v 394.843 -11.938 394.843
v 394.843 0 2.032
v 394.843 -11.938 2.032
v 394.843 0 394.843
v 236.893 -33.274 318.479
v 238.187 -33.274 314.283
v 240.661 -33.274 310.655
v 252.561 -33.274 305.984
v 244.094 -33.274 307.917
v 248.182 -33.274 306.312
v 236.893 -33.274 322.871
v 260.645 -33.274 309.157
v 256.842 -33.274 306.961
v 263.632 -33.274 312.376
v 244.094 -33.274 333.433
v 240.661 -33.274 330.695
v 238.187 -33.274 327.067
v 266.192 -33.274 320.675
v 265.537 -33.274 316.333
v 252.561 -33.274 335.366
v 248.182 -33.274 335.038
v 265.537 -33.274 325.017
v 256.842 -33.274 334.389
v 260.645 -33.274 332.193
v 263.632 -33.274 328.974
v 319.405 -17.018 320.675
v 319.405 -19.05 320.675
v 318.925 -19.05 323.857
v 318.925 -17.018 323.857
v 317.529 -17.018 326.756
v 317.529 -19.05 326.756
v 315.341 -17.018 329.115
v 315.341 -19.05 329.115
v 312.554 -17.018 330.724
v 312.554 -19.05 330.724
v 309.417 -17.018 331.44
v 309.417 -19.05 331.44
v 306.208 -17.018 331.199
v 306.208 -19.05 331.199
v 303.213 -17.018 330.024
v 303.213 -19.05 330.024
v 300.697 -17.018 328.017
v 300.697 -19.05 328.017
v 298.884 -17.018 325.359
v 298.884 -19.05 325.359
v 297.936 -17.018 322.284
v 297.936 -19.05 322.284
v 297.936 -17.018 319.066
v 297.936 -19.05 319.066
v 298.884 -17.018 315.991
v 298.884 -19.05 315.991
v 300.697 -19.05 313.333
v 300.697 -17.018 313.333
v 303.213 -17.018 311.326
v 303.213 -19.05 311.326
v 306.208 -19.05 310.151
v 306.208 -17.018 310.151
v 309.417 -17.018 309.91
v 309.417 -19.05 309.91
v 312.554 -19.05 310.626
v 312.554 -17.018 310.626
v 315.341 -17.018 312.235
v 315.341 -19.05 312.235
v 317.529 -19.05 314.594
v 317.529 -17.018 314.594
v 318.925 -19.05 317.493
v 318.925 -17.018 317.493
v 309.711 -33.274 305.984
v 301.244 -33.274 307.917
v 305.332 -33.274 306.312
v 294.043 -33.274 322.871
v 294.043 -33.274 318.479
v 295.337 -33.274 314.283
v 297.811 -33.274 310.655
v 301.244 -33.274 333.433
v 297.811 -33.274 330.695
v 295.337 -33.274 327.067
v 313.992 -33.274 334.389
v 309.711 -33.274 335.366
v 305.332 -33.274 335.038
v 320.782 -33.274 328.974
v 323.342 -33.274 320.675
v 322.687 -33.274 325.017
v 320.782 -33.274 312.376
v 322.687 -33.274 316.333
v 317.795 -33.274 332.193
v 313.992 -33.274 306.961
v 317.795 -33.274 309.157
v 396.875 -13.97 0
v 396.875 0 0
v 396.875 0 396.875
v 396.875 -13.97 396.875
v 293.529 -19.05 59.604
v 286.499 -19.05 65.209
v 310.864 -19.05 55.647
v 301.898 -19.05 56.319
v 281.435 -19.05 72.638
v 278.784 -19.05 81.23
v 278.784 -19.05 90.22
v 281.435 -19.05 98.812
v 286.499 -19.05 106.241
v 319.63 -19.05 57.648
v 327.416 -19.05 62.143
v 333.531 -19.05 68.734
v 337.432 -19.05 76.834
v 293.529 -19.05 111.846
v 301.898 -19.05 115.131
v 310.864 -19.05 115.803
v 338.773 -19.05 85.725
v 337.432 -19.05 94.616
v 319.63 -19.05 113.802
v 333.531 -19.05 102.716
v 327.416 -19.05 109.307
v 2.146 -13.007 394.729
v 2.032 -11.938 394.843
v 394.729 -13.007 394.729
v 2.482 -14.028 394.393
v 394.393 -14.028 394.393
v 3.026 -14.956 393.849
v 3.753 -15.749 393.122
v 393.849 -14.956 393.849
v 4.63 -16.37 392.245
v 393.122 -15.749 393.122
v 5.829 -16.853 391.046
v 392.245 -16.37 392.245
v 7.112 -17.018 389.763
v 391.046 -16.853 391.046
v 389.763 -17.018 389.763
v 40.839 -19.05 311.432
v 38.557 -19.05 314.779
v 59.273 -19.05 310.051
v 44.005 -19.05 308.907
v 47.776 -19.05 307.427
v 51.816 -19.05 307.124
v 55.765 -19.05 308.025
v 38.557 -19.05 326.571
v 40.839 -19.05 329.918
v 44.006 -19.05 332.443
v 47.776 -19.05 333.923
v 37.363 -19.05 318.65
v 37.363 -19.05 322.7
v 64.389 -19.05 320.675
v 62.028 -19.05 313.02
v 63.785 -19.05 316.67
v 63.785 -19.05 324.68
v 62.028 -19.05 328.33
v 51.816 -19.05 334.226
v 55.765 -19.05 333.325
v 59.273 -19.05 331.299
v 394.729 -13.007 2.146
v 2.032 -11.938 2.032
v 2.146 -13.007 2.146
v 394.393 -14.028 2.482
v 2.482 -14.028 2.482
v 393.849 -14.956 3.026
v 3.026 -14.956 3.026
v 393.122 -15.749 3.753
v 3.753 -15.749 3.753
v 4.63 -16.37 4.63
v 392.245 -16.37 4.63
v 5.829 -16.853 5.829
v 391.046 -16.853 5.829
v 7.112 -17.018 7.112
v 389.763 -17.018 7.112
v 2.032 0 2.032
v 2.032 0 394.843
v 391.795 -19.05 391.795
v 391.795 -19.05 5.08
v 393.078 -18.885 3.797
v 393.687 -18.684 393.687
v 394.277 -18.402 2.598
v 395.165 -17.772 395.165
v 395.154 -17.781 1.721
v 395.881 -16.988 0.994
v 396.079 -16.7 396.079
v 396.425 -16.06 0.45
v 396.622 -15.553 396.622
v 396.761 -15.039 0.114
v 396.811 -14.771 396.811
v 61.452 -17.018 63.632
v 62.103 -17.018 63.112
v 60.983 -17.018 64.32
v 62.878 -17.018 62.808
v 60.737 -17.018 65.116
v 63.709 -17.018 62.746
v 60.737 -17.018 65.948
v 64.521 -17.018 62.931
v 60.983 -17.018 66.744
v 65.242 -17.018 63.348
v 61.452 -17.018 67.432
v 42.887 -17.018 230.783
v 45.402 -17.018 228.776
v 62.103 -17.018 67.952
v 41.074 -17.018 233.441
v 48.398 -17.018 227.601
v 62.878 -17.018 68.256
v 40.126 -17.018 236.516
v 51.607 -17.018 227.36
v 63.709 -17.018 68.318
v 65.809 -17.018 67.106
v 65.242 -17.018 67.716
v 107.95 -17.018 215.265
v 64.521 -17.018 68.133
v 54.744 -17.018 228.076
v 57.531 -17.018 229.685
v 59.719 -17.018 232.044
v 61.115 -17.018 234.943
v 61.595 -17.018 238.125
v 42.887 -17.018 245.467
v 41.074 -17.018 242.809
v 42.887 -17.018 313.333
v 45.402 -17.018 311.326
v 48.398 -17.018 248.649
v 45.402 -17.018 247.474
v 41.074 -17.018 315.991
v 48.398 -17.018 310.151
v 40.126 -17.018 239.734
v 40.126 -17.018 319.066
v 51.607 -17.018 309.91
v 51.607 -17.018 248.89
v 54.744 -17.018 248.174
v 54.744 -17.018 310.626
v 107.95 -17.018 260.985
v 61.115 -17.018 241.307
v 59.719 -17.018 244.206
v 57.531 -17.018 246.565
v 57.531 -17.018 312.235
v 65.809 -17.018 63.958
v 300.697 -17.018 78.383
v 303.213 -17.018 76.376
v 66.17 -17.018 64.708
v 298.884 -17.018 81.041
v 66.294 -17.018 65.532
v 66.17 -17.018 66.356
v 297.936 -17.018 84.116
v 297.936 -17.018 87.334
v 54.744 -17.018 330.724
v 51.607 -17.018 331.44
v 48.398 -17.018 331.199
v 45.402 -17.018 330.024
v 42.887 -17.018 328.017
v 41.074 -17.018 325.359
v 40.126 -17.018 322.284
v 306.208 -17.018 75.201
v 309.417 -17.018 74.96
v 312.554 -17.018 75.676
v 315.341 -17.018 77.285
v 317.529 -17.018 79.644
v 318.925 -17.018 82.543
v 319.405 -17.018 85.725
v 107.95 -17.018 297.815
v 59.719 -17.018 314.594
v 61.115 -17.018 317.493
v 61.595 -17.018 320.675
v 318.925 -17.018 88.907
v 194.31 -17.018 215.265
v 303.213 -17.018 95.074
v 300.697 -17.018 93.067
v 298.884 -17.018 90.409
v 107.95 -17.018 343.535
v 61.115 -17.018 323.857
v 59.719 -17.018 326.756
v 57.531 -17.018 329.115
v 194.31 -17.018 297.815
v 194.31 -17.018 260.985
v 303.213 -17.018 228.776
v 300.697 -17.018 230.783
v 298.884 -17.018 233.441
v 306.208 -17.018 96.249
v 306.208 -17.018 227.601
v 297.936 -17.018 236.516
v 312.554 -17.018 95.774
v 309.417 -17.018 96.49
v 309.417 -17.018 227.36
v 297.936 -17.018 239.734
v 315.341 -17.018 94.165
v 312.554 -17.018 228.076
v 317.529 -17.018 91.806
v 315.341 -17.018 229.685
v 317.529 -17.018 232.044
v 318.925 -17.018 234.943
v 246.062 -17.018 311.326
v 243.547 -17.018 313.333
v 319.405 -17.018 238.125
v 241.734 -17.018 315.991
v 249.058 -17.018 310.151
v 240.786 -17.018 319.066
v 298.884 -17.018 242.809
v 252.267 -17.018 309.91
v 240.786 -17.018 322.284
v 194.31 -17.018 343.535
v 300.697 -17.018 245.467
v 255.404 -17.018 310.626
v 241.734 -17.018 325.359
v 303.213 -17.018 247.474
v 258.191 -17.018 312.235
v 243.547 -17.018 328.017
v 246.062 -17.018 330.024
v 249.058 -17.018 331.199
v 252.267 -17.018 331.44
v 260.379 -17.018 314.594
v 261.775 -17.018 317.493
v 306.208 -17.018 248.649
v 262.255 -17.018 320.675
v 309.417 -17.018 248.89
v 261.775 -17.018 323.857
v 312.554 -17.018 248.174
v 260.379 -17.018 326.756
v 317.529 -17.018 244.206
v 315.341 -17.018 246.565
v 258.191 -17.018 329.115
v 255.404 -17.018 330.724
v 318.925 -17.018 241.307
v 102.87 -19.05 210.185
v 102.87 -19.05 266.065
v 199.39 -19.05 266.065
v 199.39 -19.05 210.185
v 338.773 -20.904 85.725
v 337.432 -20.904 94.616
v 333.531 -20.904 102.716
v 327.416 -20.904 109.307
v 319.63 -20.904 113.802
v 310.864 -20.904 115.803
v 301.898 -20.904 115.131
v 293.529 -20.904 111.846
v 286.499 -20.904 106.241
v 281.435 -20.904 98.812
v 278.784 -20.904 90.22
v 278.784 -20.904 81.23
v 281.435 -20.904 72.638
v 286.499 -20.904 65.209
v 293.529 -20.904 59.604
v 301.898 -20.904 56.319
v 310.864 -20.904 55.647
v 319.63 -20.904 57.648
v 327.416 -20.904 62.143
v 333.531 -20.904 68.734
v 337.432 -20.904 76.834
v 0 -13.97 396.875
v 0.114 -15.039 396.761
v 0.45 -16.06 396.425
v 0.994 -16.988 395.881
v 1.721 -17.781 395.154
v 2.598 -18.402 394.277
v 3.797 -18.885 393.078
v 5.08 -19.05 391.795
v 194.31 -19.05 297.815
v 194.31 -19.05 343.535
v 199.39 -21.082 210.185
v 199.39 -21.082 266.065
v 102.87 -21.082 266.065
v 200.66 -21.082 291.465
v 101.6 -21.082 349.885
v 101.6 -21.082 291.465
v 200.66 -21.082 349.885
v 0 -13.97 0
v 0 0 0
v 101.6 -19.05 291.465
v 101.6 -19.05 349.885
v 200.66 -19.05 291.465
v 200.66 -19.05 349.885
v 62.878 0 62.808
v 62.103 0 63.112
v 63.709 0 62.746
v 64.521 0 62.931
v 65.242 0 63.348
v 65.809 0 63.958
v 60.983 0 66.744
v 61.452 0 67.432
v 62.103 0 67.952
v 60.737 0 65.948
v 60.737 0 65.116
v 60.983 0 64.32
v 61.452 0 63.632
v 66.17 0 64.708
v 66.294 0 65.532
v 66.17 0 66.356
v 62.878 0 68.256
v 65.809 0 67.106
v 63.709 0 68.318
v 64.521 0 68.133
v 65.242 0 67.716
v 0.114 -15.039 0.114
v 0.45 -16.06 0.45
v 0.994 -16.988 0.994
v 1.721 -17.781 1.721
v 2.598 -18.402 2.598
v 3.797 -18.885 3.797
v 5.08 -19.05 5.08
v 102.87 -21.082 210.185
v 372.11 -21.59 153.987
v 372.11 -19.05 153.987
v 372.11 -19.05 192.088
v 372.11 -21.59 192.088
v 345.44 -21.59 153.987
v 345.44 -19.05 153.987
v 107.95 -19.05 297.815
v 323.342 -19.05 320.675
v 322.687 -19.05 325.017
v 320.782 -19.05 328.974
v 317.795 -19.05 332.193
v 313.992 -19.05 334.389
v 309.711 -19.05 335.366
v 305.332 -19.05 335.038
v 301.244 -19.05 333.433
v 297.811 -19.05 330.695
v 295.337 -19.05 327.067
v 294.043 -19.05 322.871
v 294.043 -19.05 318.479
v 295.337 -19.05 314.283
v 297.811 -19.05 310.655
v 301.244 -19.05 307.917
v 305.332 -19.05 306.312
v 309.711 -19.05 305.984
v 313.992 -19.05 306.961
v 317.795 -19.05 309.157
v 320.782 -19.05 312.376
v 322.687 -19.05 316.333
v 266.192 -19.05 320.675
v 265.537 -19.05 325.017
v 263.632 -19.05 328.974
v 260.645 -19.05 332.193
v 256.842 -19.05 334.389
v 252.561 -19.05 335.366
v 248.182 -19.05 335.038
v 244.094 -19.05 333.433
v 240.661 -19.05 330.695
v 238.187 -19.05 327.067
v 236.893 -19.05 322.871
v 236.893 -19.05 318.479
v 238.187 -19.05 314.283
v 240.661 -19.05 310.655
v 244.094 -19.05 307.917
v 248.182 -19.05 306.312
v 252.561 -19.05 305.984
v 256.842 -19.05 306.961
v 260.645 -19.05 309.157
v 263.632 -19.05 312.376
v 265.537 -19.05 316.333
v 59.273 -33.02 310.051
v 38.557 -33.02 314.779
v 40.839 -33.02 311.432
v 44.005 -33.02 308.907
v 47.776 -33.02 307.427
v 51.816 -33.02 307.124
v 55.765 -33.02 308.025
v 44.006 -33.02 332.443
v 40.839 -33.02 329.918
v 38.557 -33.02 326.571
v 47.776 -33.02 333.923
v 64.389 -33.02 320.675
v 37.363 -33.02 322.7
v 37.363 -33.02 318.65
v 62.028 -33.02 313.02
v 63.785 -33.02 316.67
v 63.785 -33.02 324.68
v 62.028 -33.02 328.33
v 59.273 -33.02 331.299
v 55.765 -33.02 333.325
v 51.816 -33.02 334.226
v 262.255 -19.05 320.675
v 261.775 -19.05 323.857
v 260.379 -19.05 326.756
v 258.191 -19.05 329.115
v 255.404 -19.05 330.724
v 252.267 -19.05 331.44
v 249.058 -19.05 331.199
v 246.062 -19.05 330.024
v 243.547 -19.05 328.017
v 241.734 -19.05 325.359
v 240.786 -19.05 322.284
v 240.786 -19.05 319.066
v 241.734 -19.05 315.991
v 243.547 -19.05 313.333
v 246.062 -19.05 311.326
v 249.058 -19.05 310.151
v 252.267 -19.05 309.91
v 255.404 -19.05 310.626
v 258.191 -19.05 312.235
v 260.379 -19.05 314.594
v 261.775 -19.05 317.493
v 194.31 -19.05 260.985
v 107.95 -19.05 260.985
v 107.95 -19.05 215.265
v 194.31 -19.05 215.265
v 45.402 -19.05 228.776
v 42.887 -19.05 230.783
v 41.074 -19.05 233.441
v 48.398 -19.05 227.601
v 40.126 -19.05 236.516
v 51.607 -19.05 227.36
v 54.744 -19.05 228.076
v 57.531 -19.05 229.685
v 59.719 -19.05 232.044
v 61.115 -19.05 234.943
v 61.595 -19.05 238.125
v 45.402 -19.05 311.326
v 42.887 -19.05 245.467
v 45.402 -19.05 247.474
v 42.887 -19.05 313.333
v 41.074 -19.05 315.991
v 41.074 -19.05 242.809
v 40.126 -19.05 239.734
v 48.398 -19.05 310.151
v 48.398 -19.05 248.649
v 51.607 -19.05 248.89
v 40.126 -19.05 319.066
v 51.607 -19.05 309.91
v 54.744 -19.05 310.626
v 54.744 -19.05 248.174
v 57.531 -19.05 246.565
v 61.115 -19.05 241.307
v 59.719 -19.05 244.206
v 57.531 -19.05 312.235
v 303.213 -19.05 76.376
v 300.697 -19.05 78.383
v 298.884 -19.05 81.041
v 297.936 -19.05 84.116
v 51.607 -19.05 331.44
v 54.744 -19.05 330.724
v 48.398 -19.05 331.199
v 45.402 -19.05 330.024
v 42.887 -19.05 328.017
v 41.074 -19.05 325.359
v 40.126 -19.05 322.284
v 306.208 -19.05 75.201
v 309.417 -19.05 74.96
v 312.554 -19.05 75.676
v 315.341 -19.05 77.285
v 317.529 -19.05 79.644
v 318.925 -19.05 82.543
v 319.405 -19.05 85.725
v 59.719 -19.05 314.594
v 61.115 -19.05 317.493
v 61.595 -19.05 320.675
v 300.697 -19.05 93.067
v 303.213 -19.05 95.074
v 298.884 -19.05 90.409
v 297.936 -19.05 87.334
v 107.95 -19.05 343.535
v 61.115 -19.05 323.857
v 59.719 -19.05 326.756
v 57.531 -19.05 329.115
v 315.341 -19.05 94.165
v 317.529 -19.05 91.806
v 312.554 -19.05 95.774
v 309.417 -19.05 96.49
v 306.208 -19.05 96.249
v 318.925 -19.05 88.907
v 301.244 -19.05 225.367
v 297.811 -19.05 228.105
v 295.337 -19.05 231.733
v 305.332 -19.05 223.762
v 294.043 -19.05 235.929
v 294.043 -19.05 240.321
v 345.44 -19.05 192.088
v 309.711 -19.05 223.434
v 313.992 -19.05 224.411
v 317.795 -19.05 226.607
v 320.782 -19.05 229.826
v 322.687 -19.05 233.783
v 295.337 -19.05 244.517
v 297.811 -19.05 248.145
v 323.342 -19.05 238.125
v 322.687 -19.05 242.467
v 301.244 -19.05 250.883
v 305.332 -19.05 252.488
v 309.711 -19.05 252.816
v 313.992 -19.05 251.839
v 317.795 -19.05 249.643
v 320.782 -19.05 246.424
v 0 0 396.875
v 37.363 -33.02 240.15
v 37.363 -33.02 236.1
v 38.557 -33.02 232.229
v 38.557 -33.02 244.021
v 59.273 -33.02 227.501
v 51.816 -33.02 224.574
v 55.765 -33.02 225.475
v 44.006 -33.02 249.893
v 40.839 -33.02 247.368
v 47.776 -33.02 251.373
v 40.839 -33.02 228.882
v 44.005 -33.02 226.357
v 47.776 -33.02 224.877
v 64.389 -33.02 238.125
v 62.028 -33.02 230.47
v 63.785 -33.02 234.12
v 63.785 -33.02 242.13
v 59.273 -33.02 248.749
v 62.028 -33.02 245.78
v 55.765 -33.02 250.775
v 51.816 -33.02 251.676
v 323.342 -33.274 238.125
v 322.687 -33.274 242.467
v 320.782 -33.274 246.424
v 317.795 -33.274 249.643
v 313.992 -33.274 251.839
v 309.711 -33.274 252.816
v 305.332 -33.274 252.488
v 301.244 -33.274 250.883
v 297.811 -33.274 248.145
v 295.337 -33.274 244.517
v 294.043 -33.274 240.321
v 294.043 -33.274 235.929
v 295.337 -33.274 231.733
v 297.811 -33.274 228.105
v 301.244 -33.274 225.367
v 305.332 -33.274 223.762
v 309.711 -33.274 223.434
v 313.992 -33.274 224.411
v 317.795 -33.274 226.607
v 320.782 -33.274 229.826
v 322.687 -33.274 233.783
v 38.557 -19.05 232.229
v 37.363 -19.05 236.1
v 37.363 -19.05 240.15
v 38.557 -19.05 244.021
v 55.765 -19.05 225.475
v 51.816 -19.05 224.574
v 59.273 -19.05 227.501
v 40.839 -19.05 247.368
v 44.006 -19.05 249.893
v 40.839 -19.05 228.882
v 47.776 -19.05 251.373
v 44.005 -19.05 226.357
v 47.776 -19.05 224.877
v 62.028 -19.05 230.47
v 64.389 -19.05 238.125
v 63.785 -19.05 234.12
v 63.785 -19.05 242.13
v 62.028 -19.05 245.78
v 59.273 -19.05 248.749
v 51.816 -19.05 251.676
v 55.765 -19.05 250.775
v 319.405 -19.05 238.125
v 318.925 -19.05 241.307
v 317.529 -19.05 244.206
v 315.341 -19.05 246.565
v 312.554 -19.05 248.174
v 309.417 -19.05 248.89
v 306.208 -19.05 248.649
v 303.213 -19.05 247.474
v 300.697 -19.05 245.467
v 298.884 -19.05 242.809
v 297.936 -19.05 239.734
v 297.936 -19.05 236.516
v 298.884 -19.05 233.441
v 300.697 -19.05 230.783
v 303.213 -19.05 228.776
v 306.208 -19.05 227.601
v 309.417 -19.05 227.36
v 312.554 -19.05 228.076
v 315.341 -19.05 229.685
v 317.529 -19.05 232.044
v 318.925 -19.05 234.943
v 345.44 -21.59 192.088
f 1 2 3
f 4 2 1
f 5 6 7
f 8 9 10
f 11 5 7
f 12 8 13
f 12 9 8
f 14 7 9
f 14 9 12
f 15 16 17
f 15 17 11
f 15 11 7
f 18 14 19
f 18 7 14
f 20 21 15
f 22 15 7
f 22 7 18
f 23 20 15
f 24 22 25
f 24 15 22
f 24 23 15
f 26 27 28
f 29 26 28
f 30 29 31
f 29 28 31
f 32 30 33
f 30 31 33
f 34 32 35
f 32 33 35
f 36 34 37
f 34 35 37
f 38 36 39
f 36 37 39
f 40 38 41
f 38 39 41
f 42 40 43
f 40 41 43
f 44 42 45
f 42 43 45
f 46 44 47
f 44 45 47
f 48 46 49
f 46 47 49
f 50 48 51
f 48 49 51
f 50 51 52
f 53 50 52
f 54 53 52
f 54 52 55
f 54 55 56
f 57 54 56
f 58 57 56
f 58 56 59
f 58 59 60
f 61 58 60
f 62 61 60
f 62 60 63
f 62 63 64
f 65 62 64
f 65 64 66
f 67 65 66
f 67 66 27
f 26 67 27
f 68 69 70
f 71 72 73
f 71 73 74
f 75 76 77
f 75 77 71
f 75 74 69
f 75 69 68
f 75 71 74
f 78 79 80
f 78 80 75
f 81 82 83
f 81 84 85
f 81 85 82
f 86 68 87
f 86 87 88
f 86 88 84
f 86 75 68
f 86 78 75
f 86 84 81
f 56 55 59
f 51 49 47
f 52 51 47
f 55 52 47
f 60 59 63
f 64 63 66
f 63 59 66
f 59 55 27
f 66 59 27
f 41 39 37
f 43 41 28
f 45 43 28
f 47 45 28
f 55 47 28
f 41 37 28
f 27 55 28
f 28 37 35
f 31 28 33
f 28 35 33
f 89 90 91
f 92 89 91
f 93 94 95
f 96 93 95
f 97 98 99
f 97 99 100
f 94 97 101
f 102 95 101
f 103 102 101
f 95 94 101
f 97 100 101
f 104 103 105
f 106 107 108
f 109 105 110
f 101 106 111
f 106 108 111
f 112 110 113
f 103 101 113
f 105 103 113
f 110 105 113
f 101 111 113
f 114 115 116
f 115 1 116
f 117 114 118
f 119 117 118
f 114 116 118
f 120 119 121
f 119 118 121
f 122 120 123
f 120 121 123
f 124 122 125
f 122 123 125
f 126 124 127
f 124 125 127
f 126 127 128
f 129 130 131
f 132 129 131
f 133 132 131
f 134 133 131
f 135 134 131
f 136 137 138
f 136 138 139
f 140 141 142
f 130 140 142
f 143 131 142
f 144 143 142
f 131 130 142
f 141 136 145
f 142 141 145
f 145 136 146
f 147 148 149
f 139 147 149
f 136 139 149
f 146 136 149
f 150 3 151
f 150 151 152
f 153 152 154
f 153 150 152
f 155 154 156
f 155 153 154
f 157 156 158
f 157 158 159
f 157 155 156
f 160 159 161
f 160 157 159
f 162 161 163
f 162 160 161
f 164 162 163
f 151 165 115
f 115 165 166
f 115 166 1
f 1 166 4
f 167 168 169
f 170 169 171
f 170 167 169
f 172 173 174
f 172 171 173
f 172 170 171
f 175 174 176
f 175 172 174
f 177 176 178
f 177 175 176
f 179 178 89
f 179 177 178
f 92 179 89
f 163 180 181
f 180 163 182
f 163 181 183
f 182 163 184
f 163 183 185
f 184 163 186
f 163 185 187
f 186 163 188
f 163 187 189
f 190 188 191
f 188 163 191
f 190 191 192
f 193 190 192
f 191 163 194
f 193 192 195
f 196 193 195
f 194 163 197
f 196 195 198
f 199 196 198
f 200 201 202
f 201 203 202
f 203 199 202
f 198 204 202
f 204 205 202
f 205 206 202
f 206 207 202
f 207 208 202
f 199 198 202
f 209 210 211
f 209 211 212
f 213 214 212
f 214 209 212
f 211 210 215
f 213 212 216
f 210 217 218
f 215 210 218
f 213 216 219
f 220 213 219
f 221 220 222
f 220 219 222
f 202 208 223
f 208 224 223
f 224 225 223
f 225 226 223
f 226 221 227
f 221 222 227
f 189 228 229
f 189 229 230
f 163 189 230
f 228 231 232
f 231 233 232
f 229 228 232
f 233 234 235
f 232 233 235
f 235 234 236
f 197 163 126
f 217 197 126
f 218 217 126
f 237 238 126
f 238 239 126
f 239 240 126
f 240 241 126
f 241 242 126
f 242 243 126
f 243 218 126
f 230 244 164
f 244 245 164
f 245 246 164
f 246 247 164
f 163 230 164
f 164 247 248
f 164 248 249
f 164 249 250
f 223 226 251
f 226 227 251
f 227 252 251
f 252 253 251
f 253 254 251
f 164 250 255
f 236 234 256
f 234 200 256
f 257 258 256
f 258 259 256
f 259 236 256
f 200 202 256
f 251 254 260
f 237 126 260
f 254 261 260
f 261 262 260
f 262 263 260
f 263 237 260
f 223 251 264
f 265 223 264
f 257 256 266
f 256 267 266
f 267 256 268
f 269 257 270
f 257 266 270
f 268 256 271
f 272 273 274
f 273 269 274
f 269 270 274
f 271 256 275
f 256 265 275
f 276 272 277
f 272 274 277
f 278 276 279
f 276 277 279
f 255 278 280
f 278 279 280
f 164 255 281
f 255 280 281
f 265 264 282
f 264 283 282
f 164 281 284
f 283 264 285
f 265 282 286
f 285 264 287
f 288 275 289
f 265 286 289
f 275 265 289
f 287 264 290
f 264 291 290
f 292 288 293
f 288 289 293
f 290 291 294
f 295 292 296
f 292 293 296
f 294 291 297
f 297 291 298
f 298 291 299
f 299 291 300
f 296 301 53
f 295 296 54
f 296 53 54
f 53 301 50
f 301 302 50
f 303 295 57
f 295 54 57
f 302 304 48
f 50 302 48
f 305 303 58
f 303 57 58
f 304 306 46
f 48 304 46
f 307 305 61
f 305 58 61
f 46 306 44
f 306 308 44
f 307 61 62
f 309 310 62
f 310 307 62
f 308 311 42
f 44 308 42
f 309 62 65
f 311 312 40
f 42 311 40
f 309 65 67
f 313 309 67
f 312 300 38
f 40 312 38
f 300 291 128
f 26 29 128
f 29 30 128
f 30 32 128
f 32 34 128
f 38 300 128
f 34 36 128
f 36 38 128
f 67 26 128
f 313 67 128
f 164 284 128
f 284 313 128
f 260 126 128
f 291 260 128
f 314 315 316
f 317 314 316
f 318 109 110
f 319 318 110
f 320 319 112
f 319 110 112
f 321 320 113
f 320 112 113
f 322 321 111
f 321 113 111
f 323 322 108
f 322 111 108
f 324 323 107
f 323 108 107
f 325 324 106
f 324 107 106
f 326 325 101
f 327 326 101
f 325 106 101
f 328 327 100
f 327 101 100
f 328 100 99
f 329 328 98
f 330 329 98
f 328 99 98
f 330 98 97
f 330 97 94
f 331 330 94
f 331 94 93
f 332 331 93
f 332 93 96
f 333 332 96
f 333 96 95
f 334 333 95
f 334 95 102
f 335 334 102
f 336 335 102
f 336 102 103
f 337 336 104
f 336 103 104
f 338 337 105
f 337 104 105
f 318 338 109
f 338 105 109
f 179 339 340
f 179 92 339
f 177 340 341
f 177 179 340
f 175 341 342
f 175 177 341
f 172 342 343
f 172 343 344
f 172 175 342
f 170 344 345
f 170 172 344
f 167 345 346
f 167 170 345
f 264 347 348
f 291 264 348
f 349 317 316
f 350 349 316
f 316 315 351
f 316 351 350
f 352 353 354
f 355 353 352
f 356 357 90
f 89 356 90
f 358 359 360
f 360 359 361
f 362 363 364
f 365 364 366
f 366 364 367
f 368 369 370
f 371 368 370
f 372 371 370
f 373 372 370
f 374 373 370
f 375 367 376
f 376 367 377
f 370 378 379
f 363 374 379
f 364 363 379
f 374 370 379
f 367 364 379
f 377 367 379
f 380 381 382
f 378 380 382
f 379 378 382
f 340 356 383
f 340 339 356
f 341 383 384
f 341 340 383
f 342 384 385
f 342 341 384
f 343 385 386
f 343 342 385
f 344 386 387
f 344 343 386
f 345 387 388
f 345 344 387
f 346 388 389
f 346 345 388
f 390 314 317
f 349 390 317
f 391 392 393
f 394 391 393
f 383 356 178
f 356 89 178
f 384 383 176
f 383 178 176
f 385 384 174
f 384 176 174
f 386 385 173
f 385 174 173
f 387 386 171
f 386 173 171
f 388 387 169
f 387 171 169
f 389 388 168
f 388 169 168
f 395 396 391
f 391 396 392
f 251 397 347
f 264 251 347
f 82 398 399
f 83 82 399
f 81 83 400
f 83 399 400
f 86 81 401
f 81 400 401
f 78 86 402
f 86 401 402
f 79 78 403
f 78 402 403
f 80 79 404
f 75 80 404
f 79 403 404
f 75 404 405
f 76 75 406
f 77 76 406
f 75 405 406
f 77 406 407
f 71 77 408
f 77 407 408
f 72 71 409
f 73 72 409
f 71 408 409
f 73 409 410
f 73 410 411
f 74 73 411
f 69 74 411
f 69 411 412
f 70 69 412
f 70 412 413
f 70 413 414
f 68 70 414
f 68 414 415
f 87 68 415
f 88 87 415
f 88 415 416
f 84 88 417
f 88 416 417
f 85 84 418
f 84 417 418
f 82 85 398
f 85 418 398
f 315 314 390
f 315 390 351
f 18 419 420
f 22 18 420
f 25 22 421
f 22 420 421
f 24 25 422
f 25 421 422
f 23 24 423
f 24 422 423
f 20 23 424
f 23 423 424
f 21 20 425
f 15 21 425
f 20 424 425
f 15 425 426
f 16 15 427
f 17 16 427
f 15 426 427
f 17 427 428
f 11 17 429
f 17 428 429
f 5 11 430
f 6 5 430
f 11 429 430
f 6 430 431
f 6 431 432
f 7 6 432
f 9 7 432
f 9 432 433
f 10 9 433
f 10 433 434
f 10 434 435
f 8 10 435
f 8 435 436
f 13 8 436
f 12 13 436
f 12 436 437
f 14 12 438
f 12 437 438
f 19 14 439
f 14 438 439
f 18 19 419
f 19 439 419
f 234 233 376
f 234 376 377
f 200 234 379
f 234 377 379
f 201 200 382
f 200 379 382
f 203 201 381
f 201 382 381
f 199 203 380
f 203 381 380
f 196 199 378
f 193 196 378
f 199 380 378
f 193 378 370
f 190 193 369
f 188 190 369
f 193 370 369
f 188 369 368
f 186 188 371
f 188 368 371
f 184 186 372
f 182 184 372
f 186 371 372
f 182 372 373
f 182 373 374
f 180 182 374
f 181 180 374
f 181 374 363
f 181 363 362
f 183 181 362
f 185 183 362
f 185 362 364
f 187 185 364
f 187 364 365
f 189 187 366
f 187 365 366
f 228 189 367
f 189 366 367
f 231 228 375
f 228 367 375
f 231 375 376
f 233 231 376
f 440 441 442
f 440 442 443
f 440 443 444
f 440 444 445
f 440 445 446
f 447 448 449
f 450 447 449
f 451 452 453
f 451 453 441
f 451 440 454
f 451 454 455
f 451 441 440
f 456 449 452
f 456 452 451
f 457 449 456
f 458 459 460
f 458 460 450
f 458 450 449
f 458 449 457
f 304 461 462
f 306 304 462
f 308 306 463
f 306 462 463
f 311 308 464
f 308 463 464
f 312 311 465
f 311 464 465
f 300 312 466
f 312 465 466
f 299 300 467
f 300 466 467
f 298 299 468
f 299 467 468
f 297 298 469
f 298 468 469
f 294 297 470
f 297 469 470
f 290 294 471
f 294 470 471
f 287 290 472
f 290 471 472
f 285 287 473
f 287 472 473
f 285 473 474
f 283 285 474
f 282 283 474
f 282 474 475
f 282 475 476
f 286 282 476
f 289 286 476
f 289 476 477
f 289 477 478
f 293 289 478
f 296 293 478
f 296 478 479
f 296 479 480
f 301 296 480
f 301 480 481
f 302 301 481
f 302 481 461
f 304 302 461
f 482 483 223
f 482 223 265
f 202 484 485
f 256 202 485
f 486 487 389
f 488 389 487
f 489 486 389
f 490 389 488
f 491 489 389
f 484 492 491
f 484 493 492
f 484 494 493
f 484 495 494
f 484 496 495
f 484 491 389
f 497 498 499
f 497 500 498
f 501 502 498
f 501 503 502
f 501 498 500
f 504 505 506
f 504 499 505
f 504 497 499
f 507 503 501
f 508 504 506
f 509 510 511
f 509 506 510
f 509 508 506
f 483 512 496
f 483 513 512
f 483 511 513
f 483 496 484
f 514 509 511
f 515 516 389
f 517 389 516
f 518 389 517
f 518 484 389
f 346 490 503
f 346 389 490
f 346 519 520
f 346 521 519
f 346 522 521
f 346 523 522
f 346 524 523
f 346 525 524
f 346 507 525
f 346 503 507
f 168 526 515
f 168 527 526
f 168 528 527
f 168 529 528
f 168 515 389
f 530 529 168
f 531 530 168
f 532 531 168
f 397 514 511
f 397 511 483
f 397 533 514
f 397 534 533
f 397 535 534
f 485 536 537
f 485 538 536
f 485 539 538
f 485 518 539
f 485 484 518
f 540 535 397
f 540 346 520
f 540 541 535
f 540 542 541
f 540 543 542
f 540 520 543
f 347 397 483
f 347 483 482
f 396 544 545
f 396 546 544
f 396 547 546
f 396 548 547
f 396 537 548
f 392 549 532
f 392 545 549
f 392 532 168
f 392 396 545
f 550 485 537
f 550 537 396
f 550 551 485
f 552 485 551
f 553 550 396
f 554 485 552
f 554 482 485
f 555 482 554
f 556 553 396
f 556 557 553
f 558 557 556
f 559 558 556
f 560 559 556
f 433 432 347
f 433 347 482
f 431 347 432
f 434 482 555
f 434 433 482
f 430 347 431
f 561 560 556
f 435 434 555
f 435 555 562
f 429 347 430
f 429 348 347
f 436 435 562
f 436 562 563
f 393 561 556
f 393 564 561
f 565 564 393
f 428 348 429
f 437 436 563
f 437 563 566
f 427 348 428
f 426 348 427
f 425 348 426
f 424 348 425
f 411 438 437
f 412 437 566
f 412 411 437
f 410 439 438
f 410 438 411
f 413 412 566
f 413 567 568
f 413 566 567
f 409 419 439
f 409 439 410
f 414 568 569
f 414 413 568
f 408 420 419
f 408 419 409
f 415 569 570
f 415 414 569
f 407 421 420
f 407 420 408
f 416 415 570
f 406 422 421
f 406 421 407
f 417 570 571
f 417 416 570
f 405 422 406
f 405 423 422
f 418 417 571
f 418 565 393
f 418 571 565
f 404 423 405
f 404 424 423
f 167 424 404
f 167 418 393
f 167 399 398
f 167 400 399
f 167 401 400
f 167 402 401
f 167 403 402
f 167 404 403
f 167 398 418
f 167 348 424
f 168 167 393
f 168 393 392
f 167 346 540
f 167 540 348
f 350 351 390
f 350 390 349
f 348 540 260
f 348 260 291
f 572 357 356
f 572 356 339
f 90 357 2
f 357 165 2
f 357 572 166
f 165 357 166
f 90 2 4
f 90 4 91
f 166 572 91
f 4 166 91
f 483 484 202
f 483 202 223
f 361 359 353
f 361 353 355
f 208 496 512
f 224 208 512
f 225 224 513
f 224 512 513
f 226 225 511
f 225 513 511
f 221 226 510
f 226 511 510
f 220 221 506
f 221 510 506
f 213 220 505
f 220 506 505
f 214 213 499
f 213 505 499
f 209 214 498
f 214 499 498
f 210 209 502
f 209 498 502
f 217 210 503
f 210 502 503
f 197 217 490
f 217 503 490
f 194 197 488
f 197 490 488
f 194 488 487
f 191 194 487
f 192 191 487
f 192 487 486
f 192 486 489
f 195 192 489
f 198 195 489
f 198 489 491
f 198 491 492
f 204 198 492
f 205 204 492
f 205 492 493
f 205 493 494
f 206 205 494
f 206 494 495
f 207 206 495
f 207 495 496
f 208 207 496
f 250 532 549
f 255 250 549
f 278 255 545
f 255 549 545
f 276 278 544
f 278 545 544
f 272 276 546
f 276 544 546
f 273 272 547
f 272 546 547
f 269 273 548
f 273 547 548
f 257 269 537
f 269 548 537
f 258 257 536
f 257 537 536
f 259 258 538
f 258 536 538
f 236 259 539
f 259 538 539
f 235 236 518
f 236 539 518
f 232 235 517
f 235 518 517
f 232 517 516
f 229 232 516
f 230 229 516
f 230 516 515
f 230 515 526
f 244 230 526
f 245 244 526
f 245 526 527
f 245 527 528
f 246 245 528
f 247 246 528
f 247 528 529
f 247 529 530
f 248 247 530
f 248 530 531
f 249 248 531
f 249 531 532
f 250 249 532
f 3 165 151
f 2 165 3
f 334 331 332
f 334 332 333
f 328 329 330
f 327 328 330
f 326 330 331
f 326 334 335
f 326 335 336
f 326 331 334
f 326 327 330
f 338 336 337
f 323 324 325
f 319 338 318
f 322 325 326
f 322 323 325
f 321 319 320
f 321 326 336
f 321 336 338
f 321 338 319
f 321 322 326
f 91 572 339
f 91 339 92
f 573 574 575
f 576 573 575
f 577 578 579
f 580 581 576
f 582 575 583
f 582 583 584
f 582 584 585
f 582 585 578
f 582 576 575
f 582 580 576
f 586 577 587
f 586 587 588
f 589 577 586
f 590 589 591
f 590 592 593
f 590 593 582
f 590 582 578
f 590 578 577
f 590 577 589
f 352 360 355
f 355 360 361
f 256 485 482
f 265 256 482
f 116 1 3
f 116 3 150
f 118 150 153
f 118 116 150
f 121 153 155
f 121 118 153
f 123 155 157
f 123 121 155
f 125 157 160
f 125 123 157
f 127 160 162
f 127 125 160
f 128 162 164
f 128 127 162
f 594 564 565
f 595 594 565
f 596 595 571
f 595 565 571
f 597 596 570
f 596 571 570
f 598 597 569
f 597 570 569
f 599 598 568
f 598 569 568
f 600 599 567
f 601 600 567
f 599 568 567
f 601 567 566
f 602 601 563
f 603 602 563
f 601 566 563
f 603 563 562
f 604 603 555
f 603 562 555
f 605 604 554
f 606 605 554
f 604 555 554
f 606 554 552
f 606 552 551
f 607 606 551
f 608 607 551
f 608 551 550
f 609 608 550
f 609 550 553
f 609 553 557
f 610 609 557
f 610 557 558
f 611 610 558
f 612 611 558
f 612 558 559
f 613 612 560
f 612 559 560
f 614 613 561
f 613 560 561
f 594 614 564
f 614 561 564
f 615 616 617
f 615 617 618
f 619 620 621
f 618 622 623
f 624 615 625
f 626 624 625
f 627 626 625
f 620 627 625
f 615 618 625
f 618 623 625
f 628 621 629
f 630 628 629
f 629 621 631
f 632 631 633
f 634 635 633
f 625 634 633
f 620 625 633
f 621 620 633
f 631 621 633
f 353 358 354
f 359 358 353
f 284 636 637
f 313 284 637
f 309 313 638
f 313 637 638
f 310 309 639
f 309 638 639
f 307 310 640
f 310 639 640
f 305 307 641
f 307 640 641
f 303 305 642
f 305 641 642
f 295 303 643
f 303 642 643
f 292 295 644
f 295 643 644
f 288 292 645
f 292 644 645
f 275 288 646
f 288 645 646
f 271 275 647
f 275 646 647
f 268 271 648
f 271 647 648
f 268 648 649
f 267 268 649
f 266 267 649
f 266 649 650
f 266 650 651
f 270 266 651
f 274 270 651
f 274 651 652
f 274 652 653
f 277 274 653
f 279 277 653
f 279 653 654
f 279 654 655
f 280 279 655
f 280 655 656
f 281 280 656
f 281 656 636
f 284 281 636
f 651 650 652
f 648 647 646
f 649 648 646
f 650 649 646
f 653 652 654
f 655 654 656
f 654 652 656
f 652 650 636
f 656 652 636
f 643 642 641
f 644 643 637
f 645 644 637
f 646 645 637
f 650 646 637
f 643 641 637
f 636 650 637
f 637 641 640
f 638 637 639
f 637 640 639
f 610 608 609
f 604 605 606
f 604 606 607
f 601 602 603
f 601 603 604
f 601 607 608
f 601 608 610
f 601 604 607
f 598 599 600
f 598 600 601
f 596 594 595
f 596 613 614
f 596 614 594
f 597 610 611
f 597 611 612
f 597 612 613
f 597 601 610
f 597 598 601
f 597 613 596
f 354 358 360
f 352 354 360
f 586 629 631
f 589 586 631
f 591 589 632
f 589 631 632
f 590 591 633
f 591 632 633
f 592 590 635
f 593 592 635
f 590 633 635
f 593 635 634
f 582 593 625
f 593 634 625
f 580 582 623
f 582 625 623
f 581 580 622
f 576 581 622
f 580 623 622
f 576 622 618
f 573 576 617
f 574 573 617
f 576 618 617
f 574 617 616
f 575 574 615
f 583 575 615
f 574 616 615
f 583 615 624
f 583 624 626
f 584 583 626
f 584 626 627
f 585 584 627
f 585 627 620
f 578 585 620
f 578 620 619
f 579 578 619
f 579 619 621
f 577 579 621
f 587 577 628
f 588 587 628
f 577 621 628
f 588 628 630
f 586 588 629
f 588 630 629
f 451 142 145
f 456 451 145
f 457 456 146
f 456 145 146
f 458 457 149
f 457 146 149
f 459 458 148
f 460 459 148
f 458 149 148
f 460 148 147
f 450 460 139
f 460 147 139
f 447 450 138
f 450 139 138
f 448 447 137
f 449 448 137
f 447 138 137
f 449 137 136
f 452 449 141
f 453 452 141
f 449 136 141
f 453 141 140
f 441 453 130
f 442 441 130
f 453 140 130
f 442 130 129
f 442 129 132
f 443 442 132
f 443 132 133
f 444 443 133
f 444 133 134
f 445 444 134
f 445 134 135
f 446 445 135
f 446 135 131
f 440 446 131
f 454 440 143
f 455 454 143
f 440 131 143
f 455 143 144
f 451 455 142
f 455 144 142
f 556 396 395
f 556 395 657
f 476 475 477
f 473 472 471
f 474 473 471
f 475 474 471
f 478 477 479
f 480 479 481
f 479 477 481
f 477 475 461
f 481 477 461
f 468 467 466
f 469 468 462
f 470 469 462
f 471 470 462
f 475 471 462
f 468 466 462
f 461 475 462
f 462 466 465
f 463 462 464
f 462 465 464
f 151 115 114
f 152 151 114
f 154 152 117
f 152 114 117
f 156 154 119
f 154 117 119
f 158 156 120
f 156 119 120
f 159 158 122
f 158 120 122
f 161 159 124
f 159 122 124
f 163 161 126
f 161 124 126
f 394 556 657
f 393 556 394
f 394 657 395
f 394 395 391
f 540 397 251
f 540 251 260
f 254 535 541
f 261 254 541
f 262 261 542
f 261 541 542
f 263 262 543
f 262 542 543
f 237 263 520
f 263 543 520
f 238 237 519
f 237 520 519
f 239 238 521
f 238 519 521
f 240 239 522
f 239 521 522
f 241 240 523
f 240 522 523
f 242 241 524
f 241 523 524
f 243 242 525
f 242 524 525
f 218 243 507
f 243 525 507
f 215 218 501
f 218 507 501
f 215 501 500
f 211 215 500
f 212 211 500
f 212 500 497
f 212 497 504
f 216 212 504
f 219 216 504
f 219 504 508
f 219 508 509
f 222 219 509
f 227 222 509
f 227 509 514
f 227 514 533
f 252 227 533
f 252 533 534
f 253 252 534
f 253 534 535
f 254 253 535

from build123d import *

# Parameters (mm, degrees)
F0_W      = 396.875
F0_H      = 396.875
F1_DEPTH  = 19.05
F2_W      = 392.811
F2_H      = 392.811
F3_DEPTH  = 17.018
F4_R      = 5.08
F5_R      = 5.08
F6_R      = 2.794
F7_DEPTH  = 17.018
F8_R      = 10.795
F8_W      = 86.36
F8_H      = 45.72
F9_DEPTH  = 19.051
F10_R     = 13.589
F11_DEPTH = 13.97
F12_W     = 99.06
F12_H     = 58.42
F12_W_2   = 96.52
F12_H_2   = 55.88
F13_DEPTH = 2.032
F14_R     = 14.732
F15_DEPTH = 14.224
F16_R     = 30.1625
F17_DEPTH = 1.8542
F18_W     = 26.67
F18_H     = 38.1
F19_DEPTH = 2.54


with BuildPart() as f1:
    # F0 (on Front) → F1 (new body)
    with BuildSketch(Plane.XZ):
        with Locations((198.4375, 198.4375)):
            Rectangle(F0_W, F0_H)
    extrude(amount=F1_DEPTH)

    # F2 (on Front) → F3 (cut)
    with BuildSketch(Plane.XZ):
        with Locations((198.4375, 198.4375)):
            Rectangle(F2_W, F2_H)
    extrude(amount=F3_DEPTH, mode=Mode.SUBTRACT)

    # F4
    f4_edges = [f1.edges().sort_by_distance(p)[0] for p in [
        (0, -19.05, 198.4375),
        (198.4375, -19.05, 0),
        (396.875, -19.05, 198.4375),
        (198.4375, -19.05, 396.875),
    ]]
    fillet(f4_edges, radius=F4_R)

    # F5
    f5_edges = [f1.edges().sort_by_distance(p)[0] for p in [
        (198.4375, -17.018, 2.032),
        (394.843, -17.018, 198.4375),
        (198.4375, -17.018, 394.843),
        (2.032, -17.018, 198.4375),
    ]]
    fillet(f5_edges, radius=F5_R)

    # F6 (on Front) → F7 (join, through all)
    with BuildSketch(Plane.XZ):
        with Locations((63.5, 65.532)):
            Circle(F6_R)
    extrude(amount=F7_DEPTH)

    # F8 (on face) → F9 (cut, through all)
    with BuildSketch(Plane.XZ.offset(19.05)):
        with Locations((50.8, 320.675)):
            Circle(F8_R)
        with Locations((50.8, 238.125)):
            Circle(F8_R)
        with Locations((151.13, 320.675)):
            Rectangle(F8_W, F8_H)
        with Locations((151.13, 238.125)):
            Rectangle(F8_W, F8_H)
        with Locations((251.46, 320.675)):
            Circle(F8_R)
        with Locations((308.61, 320.675)):
            Circle(F8_R)
        with Locations((308.61, 238.125)):
            Circle(F8_R)
        with Locations((308.61, 85.725)):
            Circle(F8_R)
    extrude(amount=-F9_DEPTH, mode=Mode.SUBTRACT)

    # F14 (on face) → F15 (join)
    with BuildSketch(Plane.XZ.offset(19.05)):
        with Locations((251.46, 320.675)):
            Circle(F14_R)
        with Locations((308.61, 320.675)):
            Circle(F14_R)
        with Locations((308.61, 238.125)):
            Circle(F14_R)
    extrude(amount=F15_DEPTH)

    # F18 (on face) → F19 (join)
    with BuildSketch(Plane.XZ.offset(19.05)):
        with Locations((358.775, 173.0375)):
            Rectangle(F18_W, F18_H)
    extrude(amount=F19_DEPTH)


with BuildPart() as f11:
    # F10 (on face) → F11 (new body)
    with BuildSketch(Plane.XZ.offset(19.05)):
        with Locations((50.8, 320.675)):
            Circle(F10_R)
        with Locations((50.8, 238.125)):
            Circle(F10_R)
    extrude(amount=F11_DEPTH)


with BuildPart() as f13:
    # F12 (on face) → F13 (new body)
    with BuildSketch(Plane.XZ.offset(19.05)):
        with Locations((151.13, 320.675)):
            Rectangle(F12_W, F12_H)
        with Locations((151.13, 238.125)):
            Rectangle(F12_W_2, F12_H_2)
    extrude(amount=F13_DEPTH)


with BuildPart() as f17:
    # F16 (on face) → F17 (new body)
    with BuildSketch(Plane.XZ.offset(19.05)):
        with Locations((308.61, 85.725)):
            Circle(F16_R)
    extrude(amount=F17_DEPTH)


solid = Compound([f1.part, f11.part, f13.part, f17.part])
